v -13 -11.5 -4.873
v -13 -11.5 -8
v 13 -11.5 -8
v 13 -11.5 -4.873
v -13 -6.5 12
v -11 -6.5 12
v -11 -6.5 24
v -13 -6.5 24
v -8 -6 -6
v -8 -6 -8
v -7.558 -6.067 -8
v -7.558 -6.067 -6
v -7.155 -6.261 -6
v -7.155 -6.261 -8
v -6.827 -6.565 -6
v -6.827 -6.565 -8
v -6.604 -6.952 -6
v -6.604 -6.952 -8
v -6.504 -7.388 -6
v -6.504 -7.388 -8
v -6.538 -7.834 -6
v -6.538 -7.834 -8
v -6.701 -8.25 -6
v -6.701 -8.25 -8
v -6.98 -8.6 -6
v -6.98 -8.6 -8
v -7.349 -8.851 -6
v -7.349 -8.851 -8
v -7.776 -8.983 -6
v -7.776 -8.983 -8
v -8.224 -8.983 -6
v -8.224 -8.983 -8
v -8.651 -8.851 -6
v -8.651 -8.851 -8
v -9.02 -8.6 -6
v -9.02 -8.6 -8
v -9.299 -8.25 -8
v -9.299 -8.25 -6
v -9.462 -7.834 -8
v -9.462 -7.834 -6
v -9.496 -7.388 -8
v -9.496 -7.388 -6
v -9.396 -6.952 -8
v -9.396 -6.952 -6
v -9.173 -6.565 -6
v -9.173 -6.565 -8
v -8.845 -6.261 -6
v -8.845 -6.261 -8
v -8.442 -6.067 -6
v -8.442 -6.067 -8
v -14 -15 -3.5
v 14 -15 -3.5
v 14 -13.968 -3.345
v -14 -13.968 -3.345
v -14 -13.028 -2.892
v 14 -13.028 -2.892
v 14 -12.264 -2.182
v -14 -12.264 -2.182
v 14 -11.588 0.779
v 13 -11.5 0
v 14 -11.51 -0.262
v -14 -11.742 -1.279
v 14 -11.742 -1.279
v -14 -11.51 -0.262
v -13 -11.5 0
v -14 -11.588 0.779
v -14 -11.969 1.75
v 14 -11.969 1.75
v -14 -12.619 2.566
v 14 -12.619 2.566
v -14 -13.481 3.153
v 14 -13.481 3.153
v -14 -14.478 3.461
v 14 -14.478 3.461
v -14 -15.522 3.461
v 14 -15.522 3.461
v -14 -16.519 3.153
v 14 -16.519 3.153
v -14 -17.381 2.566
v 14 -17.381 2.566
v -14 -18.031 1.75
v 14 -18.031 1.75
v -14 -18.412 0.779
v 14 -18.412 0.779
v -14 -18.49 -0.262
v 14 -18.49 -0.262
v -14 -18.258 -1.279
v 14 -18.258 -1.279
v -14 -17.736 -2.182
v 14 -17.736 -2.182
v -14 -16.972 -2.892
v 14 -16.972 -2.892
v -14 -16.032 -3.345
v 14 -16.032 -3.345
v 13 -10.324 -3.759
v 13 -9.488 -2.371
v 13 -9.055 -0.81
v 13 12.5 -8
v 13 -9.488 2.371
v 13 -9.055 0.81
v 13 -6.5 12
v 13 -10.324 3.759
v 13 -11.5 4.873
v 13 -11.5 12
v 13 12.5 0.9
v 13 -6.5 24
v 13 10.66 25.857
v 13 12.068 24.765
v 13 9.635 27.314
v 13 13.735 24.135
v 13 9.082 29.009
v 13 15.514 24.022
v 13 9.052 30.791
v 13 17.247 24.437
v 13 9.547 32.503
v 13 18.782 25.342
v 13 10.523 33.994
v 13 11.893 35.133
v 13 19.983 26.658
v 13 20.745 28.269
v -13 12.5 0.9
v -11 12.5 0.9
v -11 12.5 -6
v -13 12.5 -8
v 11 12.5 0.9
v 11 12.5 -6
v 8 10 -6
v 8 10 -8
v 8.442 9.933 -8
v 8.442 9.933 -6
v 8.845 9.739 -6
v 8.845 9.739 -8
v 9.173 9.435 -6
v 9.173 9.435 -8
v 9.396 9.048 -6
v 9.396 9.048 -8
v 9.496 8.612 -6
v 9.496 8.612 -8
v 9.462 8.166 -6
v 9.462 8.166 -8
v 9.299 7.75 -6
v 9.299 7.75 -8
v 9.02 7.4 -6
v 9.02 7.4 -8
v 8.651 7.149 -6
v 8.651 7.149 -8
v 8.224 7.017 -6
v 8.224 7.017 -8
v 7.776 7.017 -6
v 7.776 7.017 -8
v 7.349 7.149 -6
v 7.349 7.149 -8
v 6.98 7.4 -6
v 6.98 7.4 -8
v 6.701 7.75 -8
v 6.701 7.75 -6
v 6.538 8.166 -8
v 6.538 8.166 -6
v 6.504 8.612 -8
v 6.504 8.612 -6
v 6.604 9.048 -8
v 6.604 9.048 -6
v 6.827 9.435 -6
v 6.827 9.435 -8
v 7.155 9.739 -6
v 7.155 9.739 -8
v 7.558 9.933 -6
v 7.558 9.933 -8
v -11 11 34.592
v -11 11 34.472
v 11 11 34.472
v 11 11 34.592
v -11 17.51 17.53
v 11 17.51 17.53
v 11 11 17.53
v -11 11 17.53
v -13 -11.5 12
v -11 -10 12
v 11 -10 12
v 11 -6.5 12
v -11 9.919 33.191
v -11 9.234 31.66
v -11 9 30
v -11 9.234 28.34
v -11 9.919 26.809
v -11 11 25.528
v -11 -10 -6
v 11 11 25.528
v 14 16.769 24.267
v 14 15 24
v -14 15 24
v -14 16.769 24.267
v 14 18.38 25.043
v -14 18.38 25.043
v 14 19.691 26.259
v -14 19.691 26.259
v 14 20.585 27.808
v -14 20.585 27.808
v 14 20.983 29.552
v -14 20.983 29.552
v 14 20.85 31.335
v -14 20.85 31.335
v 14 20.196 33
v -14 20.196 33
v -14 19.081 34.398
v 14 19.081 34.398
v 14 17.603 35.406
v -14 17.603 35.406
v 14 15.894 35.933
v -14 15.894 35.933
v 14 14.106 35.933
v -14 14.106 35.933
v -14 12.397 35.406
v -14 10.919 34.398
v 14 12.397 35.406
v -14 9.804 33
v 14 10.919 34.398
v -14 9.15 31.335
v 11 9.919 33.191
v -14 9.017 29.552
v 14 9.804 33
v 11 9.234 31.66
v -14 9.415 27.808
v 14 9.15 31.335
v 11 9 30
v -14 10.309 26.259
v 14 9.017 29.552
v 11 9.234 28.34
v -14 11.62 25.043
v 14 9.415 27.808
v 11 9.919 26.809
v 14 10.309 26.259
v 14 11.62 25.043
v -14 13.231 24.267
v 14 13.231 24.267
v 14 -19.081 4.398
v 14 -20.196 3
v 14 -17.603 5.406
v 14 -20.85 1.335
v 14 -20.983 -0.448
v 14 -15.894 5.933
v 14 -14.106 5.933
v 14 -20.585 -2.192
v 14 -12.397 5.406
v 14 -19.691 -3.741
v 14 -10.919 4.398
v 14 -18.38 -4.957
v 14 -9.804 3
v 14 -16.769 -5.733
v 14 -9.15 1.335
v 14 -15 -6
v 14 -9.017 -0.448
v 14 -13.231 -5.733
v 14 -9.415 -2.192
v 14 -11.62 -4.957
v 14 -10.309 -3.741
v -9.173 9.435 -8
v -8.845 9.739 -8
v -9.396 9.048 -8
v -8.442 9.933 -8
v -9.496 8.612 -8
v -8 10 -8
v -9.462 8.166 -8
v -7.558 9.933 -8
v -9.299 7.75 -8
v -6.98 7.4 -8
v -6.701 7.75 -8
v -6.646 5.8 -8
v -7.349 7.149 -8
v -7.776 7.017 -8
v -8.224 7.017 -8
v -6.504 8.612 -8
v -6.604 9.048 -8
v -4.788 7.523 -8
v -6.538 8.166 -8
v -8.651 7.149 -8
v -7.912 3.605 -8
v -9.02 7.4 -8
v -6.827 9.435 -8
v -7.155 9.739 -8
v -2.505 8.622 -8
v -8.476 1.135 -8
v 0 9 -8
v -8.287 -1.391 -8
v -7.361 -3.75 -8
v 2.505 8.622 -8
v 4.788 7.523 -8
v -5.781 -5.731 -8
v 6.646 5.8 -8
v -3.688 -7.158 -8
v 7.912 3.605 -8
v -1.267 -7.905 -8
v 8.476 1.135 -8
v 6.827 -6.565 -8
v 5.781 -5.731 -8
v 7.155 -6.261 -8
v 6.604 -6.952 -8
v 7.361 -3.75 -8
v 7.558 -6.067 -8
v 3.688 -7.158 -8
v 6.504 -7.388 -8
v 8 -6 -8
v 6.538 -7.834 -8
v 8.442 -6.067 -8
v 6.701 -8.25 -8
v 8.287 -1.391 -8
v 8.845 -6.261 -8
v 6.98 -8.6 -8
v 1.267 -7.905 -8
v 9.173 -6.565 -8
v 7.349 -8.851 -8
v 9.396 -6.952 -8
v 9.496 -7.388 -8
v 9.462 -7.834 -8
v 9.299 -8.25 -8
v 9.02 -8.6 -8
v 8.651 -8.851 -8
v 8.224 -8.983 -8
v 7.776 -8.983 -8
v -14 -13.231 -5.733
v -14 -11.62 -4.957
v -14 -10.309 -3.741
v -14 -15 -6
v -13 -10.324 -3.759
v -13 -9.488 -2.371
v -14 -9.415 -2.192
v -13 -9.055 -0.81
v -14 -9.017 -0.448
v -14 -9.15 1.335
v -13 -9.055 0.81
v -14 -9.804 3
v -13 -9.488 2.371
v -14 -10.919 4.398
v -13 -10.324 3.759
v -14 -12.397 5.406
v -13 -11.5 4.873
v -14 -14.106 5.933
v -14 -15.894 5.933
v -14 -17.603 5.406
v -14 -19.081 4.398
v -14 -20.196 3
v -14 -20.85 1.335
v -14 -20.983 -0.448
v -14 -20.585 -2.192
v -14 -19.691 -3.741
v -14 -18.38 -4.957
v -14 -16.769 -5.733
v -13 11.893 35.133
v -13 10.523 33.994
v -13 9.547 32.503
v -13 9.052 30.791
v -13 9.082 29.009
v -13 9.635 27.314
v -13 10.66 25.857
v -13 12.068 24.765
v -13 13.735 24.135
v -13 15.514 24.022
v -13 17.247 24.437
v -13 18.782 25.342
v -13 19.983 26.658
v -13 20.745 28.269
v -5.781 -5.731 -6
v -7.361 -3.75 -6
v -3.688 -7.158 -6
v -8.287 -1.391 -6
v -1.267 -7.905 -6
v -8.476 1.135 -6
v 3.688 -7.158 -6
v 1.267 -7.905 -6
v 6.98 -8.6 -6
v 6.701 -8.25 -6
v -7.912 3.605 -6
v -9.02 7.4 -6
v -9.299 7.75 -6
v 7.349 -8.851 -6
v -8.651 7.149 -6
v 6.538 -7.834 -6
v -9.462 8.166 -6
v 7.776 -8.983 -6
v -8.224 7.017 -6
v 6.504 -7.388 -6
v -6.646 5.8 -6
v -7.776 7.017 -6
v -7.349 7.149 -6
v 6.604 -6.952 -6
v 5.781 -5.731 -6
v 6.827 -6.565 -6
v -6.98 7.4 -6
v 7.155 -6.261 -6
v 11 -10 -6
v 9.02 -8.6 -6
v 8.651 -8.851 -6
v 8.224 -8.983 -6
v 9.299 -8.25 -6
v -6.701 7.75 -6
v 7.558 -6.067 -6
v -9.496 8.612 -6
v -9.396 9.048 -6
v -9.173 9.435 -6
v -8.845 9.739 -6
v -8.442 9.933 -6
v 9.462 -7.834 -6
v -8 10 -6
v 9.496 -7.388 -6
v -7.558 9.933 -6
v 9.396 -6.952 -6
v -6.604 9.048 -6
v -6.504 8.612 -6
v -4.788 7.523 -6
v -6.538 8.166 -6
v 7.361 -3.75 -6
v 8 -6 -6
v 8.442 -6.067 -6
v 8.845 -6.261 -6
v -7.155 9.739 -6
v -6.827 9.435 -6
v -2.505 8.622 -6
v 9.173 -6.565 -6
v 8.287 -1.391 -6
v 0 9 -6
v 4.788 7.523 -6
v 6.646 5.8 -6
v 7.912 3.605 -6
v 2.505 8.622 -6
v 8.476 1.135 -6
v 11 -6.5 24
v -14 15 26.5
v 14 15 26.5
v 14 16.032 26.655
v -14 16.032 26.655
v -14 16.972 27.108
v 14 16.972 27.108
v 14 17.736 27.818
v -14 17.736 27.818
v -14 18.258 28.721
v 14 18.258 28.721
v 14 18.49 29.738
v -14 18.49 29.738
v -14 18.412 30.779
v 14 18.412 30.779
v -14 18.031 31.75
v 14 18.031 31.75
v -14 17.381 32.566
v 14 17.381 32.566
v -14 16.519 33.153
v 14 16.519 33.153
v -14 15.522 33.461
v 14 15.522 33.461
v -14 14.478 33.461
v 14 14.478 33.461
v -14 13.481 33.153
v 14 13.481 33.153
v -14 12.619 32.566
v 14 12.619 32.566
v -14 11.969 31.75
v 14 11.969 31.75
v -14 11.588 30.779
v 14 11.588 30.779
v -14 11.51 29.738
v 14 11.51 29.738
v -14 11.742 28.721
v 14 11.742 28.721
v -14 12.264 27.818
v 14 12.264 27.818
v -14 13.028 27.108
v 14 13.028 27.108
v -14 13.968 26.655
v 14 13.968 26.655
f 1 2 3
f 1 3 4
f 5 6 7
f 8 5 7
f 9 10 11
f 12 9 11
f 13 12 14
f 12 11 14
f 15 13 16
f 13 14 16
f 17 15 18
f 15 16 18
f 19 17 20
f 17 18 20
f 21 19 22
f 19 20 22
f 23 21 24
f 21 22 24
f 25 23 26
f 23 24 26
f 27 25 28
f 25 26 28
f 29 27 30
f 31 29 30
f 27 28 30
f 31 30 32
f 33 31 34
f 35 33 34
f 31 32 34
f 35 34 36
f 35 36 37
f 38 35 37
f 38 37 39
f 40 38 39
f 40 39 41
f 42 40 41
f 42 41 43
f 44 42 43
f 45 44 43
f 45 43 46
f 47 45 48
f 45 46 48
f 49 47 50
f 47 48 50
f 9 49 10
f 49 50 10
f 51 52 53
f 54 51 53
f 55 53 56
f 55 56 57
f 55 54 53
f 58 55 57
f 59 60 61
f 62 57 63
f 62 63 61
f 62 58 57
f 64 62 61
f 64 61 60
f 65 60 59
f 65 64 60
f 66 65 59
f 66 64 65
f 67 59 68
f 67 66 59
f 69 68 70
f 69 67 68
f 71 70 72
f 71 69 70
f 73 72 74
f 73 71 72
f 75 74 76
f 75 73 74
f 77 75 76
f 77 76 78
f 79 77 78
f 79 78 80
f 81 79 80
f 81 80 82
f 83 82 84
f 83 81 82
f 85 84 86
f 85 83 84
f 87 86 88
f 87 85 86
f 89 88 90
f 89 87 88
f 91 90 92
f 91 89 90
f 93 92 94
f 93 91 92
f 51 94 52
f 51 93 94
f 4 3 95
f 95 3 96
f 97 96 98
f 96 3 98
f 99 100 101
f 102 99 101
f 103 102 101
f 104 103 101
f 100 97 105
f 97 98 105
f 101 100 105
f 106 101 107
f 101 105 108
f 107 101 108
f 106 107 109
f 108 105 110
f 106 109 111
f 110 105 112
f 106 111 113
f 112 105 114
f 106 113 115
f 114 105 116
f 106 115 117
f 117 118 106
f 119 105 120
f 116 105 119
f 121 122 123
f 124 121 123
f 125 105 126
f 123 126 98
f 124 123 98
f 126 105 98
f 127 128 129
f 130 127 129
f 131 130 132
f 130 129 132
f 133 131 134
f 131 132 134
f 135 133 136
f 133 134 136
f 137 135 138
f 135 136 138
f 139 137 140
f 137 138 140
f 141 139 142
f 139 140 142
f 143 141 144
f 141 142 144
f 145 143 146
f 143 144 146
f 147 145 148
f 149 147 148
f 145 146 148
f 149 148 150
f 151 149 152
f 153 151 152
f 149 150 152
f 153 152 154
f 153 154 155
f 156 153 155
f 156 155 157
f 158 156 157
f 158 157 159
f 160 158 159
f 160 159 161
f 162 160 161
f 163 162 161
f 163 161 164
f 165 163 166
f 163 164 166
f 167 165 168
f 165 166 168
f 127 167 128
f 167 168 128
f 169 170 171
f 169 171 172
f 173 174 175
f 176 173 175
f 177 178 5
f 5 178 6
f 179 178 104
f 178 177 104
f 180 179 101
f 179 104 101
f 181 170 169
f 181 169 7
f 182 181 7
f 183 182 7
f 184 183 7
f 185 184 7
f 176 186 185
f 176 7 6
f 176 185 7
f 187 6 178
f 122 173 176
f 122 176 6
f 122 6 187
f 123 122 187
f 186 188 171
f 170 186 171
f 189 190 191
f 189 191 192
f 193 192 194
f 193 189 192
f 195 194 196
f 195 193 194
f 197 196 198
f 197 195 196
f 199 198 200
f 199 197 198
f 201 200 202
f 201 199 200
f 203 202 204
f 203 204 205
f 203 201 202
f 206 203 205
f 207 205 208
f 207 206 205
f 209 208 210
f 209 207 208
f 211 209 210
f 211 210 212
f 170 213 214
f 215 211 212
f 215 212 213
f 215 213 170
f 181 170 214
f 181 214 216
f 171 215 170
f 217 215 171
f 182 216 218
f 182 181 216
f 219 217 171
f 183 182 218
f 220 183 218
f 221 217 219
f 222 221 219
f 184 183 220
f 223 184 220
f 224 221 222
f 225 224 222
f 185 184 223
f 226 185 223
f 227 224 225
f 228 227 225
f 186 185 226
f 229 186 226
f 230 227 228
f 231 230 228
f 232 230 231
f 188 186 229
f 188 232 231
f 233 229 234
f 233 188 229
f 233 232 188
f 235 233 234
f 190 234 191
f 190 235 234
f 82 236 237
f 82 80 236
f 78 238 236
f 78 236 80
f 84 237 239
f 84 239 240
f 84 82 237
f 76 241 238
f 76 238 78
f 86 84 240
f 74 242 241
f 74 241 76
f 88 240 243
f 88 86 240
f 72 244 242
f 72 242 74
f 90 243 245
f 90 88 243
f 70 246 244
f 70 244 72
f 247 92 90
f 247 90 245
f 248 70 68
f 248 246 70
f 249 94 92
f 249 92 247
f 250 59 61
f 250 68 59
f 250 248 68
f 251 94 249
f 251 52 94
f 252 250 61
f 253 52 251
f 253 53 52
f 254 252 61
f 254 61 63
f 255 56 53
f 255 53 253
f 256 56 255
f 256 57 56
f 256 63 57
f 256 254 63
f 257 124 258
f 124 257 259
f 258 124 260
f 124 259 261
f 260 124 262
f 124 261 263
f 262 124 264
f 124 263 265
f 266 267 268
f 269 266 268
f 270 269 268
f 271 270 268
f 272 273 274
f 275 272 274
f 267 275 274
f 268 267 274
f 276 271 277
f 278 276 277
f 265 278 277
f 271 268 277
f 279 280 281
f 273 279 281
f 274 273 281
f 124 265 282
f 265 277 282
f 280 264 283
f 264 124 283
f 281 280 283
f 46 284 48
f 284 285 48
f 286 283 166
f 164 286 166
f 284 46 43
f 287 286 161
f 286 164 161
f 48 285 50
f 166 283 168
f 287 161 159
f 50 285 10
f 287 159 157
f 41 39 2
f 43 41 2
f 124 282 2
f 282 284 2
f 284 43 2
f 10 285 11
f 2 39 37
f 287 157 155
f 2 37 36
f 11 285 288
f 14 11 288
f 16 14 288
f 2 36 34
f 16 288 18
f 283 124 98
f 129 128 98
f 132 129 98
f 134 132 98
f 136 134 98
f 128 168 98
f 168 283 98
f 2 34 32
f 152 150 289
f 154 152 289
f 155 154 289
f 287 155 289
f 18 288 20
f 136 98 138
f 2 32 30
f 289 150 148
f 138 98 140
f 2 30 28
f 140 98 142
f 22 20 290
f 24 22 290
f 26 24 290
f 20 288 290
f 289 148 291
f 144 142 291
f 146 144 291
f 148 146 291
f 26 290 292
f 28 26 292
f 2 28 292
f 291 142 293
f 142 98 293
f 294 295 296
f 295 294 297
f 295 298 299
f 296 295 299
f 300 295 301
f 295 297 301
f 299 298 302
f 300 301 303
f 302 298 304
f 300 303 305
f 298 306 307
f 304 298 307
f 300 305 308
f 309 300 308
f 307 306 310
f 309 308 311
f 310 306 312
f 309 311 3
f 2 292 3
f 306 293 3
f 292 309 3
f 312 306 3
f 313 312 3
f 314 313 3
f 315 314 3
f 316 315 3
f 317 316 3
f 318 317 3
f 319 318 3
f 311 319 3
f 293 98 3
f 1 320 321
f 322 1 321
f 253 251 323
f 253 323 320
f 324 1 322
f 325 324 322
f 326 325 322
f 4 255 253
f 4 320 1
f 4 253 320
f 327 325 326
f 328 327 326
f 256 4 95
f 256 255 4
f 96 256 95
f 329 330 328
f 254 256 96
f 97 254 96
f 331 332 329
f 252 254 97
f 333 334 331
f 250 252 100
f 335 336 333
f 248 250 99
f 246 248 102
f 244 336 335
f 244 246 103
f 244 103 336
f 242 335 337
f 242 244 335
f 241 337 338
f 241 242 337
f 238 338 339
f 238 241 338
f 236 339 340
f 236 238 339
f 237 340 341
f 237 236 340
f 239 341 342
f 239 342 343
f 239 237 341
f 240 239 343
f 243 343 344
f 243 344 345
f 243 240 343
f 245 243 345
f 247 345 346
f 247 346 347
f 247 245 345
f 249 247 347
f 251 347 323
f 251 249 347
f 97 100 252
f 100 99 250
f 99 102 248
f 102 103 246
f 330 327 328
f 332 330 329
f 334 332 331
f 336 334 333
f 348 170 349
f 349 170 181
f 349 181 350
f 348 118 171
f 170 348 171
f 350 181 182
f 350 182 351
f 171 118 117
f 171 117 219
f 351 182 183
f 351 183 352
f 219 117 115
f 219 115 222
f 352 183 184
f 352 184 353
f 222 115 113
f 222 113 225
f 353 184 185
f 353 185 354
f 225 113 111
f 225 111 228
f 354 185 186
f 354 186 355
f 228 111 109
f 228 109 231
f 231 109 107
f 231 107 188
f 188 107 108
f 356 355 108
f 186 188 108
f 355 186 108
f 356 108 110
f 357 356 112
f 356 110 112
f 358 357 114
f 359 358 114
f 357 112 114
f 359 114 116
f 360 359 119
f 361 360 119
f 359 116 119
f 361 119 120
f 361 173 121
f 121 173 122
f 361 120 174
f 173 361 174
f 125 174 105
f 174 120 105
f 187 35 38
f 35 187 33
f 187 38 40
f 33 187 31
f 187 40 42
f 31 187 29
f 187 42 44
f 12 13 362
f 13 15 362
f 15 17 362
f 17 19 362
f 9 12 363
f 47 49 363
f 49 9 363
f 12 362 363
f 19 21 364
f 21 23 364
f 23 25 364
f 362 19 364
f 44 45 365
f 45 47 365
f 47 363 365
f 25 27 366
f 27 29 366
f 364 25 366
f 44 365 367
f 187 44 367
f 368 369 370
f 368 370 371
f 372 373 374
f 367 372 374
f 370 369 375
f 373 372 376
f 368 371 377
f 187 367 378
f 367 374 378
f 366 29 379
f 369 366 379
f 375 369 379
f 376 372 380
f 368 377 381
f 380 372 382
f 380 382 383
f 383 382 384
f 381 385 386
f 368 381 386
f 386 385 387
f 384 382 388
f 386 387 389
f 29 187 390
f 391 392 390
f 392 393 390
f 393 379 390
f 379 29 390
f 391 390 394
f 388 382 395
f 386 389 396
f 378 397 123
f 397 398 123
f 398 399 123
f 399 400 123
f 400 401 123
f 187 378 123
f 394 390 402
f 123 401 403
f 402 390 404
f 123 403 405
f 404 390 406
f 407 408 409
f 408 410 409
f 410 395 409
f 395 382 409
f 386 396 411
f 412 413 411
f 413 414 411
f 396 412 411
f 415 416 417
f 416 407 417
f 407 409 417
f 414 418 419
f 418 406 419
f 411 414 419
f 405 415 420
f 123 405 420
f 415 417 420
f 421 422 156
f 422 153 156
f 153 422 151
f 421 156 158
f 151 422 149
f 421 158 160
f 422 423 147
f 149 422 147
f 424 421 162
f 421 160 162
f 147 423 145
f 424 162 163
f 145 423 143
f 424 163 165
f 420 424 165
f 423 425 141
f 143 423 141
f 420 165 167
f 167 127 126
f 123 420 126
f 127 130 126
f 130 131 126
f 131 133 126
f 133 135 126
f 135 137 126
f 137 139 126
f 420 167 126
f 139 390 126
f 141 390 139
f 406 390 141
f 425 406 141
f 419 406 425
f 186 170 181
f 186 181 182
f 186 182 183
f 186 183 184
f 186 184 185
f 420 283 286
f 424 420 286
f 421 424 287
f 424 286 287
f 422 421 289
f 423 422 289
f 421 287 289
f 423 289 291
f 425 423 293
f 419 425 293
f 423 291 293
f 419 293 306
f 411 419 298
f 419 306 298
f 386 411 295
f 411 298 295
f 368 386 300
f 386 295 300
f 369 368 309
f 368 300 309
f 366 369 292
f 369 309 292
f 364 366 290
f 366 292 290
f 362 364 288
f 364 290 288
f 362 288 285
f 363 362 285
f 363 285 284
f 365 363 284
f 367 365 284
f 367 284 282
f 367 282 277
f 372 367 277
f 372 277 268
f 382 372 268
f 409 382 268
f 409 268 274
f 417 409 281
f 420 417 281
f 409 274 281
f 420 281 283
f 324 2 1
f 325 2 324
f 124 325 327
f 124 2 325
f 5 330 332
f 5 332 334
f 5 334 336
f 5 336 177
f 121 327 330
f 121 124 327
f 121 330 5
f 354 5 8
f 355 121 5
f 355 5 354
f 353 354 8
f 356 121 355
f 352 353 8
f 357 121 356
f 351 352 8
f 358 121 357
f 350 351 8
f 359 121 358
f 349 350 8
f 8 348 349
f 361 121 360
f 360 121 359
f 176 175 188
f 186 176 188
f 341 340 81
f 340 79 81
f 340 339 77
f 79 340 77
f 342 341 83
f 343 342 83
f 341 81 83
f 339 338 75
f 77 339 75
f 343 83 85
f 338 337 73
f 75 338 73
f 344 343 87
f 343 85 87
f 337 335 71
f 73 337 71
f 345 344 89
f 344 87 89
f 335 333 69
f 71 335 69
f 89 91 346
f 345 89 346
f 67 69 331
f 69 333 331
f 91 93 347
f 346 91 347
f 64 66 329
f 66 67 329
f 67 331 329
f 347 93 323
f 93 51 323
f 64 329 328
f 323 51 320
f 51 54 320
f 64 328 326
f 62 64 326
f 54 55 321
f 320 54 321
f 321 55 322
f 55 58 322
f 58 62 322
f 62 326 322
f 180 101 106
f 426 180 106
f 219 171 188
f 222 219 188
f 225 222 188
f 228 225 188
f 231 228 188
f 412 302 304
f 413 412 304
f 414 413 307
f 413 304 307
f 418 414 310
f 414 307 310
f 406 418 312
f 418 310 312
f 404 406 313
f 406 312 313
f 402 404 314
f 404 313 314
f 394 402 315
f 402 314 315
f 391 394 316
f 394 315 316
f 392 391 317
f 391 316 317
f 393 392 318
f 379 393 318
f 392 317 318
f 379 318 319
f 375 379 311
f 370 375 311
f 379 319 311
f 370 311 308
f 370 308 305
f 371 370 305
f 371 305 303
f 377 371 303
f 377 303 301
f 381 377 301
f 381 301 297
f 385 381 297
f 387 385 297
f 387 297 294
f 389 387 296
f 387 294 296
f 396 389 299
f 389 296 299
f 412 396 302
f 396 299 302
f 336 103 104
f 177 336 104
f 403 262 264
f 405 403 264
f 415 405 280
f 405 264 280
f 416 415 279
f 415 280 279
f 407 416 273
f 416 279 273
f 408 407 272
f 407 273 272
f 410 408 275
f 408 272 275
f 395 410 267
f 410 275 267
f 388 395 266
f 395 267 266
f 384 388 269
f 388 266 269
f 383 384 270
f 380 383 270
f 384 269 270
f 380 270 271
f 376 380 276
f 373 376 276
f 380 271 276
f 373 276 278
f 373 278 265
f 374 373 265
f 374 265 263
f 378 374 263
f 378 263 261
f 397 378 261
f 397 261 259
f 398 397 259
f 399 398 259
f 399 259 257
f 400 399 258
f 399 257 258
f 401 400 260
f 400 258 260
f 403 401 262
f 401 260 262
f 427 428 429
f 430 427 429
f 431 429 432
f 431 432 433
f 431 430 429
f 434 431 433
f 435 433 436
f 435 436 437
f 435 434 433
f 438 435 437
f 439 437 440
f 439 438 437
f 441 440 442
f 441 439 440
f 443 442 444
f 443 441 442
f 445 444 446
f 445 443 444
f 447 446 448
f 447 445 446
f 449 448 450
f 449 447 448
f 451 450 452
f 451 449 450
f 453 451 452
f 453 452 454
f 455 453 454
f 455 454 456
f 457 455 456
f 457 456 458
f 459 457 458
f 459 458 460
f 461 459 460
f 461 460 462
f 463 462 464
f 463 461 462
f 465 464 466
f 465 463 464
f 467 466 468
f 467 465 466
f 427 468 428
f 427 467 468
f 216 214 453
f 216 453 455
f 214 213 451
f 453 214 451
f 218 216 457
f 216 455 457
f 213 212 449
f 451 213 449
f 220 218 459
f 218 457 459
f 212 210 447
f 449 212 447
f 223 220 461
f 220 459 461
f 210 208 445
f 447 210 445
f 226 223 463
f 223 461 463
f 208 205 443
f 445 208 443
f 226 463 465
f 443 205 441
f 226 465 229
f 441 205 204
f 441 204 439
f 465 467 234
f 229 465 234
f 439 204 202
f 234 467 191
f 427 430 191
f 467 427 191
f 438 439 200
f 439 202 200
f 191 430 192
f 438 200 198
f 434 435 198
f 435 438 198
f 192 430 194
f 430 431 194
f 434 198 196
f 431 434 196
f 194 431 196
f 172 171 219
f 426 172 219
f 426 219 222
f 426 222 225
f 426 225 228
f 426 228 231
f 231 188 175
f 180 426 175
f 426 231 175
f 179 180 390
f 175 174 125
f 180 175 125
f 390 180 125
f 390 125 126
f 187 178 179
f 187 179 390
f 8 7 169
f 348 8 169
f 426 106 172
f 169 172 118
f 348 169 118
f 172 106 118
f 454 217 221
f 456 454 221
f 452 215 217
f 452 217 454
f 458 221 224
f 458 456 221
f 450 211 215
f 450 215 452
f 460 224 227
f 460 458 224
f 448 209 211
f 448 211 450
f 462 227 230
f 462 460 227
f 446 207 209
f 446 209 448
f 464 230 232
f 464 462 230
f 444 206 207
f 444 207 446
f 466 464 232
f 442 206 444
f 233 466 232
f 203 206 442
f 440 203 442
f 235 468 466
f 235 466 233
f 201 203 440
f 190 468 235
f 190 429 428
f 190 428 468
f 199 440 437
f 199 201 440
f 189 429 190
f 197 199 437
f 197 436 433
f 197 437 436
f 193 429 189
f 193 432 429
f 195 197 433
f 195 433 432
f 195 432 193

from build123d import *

# Parameters (mm, degrees)
SKETCH1_R             = 6
SKETCH1_R_2           = 3.5
BOSS_EXTRUDE1_DEPTH   = 14
BOSS_EXTRUDE1_2_DEPTH = 14
BOSS_EXTRUDE2_DEPTH   = 13
CUT_EXTRUDE2_DEPTH    = 11
SKETCH5_R             = 8.5
SKETCH5_R_2           = 1.5
CUT_EXTRUDE3_DEPTH    = 2


with BuildPart() as part:
    # Sketch1 → Boss-Extrude1 (new, symmetric)
    with BuildSketch(Plane(origin=(0, 0, 0), x_dir=(0, 0, -1), z_dir=(1, 0, 0))):
        with Locations((-30, 15)):
            Circle(SKETCH1_R)
        with Locations((-30, 15)):
            Circle(SKETCH1_R_2, mode=Mode.SUBTRACT)
    extrude(amount=BOSS_EXTRUDE1_DEPTH, both=True)


with BuildPart() as body_2:
    # Sketch1 → Boss-Extrude1 2 (new, symmetric)
    with BuildSketch(Plane(origin=(0, 0, 0), x_dir=(0, 0, -1), z_dir=(1, 0, 0))):
        with Locations((0, -15)):
            Circle(SKETCH1_R)
        with Locations((0, -15)):
            Circle(SKETCH1_R_2, mode=Mode.SUBTRACT)
    extrude(amount=BOSS_EXTRUDE1_2_DEPTH, both=True)

    # Sketch2 → Boss-Extrude2 (add, symmetric)
    with BuildSketch(Plane(origin=(0, 0, 0), x_dir=(0, 0, -1), z_dir=(1, 0, 0))):
        with BuildLine():
            Line((8, 12.5), (8, -11.5))
            Line((8, -11.5), (-12, -11.5))
            Line((-12, -11.5), (-12, -6.5))
            Line((-12, -6.5), (-24, -6.5))
            Line((-24, -6.5), (-35.132965379, 11.893125941))
            ThreePointArc((-35.132965379, 11.893125941), (-25.25839516, 11.323427745), (-28.269359085, 20.744987556))
            Line((-28.269359085, 20.744987556), (-0.899527194, 12.5))
            Line((-0.899527194, 12.5), (8, 12.5))
        make_face()
    extrude(amount=BOSS_EXTRUDE2_DEPTH, both=True)


with BuildPart() as cut_extrude2_tool:
    # Sketch4 → Cut-Extrude2 (new, symmetric)
    with BuildSketch(Plane(origin=(0, 0, 0), x_dir=(0, 0, -1), z_dir=(1, 0, 0))):
        Polygon((6, 12.5), (-0.899527194, 12.5), (-17.529603633, 17.509704621), (-17.529603633, 11), (-36, 11), (-36, -10), (6, -10), align=None)
    extrude(amount=CUT_EXTRUDE2_DEPTH, both=True)


with BuildPart() as part_1:
    add(part.part)

    # Cut-Extrude2: cut by cut_extrude2_tool
    add(cut_extrude2_tool.part, mode=Mode.SUBTRACT)


with BuildPart() as body_2_1:
    add(body_2.part)

    # Cut-Extrude2: cut by cut_extrude2_tool
    add(cut_extrude2_tool.part, mode=Mode.SUBTRACT)

    # Sketch5 → Cut-Extrude3 (cut)
    with BuildSketch(Plane(origin=(0, 0, -8), x_dir=(-1, 0, 0), z_dir=(0, 0, -1))):
        with Locations(Location((0, 0.5, 0), (0, 0, 90))):
            Circle(SKETCH5_R)
        with Locations(Location((-8, 8.5, 0), (0, 0, 90))):
            Circle(SKETCH5_R_2)
        with Locations(Location((-8, -7.5, 0), (0, 0, 90))):
            Circle(SKETCH5_R_2)
        with Locations(Location((8, 8.5, 0), (0, 0, 90))):
            Circle(SKETCH5_R_2)
        with Locations(Location((8, -7.5, 0), (0, 0, 90))):
            Circle(SKETCH5_R_2)
    extrude(amount=-CUT_EXTRUDE3_DEPTH, mode=Mode.SUBTRACT)


solid = Compound([part_1.part, body_2_1.part])
